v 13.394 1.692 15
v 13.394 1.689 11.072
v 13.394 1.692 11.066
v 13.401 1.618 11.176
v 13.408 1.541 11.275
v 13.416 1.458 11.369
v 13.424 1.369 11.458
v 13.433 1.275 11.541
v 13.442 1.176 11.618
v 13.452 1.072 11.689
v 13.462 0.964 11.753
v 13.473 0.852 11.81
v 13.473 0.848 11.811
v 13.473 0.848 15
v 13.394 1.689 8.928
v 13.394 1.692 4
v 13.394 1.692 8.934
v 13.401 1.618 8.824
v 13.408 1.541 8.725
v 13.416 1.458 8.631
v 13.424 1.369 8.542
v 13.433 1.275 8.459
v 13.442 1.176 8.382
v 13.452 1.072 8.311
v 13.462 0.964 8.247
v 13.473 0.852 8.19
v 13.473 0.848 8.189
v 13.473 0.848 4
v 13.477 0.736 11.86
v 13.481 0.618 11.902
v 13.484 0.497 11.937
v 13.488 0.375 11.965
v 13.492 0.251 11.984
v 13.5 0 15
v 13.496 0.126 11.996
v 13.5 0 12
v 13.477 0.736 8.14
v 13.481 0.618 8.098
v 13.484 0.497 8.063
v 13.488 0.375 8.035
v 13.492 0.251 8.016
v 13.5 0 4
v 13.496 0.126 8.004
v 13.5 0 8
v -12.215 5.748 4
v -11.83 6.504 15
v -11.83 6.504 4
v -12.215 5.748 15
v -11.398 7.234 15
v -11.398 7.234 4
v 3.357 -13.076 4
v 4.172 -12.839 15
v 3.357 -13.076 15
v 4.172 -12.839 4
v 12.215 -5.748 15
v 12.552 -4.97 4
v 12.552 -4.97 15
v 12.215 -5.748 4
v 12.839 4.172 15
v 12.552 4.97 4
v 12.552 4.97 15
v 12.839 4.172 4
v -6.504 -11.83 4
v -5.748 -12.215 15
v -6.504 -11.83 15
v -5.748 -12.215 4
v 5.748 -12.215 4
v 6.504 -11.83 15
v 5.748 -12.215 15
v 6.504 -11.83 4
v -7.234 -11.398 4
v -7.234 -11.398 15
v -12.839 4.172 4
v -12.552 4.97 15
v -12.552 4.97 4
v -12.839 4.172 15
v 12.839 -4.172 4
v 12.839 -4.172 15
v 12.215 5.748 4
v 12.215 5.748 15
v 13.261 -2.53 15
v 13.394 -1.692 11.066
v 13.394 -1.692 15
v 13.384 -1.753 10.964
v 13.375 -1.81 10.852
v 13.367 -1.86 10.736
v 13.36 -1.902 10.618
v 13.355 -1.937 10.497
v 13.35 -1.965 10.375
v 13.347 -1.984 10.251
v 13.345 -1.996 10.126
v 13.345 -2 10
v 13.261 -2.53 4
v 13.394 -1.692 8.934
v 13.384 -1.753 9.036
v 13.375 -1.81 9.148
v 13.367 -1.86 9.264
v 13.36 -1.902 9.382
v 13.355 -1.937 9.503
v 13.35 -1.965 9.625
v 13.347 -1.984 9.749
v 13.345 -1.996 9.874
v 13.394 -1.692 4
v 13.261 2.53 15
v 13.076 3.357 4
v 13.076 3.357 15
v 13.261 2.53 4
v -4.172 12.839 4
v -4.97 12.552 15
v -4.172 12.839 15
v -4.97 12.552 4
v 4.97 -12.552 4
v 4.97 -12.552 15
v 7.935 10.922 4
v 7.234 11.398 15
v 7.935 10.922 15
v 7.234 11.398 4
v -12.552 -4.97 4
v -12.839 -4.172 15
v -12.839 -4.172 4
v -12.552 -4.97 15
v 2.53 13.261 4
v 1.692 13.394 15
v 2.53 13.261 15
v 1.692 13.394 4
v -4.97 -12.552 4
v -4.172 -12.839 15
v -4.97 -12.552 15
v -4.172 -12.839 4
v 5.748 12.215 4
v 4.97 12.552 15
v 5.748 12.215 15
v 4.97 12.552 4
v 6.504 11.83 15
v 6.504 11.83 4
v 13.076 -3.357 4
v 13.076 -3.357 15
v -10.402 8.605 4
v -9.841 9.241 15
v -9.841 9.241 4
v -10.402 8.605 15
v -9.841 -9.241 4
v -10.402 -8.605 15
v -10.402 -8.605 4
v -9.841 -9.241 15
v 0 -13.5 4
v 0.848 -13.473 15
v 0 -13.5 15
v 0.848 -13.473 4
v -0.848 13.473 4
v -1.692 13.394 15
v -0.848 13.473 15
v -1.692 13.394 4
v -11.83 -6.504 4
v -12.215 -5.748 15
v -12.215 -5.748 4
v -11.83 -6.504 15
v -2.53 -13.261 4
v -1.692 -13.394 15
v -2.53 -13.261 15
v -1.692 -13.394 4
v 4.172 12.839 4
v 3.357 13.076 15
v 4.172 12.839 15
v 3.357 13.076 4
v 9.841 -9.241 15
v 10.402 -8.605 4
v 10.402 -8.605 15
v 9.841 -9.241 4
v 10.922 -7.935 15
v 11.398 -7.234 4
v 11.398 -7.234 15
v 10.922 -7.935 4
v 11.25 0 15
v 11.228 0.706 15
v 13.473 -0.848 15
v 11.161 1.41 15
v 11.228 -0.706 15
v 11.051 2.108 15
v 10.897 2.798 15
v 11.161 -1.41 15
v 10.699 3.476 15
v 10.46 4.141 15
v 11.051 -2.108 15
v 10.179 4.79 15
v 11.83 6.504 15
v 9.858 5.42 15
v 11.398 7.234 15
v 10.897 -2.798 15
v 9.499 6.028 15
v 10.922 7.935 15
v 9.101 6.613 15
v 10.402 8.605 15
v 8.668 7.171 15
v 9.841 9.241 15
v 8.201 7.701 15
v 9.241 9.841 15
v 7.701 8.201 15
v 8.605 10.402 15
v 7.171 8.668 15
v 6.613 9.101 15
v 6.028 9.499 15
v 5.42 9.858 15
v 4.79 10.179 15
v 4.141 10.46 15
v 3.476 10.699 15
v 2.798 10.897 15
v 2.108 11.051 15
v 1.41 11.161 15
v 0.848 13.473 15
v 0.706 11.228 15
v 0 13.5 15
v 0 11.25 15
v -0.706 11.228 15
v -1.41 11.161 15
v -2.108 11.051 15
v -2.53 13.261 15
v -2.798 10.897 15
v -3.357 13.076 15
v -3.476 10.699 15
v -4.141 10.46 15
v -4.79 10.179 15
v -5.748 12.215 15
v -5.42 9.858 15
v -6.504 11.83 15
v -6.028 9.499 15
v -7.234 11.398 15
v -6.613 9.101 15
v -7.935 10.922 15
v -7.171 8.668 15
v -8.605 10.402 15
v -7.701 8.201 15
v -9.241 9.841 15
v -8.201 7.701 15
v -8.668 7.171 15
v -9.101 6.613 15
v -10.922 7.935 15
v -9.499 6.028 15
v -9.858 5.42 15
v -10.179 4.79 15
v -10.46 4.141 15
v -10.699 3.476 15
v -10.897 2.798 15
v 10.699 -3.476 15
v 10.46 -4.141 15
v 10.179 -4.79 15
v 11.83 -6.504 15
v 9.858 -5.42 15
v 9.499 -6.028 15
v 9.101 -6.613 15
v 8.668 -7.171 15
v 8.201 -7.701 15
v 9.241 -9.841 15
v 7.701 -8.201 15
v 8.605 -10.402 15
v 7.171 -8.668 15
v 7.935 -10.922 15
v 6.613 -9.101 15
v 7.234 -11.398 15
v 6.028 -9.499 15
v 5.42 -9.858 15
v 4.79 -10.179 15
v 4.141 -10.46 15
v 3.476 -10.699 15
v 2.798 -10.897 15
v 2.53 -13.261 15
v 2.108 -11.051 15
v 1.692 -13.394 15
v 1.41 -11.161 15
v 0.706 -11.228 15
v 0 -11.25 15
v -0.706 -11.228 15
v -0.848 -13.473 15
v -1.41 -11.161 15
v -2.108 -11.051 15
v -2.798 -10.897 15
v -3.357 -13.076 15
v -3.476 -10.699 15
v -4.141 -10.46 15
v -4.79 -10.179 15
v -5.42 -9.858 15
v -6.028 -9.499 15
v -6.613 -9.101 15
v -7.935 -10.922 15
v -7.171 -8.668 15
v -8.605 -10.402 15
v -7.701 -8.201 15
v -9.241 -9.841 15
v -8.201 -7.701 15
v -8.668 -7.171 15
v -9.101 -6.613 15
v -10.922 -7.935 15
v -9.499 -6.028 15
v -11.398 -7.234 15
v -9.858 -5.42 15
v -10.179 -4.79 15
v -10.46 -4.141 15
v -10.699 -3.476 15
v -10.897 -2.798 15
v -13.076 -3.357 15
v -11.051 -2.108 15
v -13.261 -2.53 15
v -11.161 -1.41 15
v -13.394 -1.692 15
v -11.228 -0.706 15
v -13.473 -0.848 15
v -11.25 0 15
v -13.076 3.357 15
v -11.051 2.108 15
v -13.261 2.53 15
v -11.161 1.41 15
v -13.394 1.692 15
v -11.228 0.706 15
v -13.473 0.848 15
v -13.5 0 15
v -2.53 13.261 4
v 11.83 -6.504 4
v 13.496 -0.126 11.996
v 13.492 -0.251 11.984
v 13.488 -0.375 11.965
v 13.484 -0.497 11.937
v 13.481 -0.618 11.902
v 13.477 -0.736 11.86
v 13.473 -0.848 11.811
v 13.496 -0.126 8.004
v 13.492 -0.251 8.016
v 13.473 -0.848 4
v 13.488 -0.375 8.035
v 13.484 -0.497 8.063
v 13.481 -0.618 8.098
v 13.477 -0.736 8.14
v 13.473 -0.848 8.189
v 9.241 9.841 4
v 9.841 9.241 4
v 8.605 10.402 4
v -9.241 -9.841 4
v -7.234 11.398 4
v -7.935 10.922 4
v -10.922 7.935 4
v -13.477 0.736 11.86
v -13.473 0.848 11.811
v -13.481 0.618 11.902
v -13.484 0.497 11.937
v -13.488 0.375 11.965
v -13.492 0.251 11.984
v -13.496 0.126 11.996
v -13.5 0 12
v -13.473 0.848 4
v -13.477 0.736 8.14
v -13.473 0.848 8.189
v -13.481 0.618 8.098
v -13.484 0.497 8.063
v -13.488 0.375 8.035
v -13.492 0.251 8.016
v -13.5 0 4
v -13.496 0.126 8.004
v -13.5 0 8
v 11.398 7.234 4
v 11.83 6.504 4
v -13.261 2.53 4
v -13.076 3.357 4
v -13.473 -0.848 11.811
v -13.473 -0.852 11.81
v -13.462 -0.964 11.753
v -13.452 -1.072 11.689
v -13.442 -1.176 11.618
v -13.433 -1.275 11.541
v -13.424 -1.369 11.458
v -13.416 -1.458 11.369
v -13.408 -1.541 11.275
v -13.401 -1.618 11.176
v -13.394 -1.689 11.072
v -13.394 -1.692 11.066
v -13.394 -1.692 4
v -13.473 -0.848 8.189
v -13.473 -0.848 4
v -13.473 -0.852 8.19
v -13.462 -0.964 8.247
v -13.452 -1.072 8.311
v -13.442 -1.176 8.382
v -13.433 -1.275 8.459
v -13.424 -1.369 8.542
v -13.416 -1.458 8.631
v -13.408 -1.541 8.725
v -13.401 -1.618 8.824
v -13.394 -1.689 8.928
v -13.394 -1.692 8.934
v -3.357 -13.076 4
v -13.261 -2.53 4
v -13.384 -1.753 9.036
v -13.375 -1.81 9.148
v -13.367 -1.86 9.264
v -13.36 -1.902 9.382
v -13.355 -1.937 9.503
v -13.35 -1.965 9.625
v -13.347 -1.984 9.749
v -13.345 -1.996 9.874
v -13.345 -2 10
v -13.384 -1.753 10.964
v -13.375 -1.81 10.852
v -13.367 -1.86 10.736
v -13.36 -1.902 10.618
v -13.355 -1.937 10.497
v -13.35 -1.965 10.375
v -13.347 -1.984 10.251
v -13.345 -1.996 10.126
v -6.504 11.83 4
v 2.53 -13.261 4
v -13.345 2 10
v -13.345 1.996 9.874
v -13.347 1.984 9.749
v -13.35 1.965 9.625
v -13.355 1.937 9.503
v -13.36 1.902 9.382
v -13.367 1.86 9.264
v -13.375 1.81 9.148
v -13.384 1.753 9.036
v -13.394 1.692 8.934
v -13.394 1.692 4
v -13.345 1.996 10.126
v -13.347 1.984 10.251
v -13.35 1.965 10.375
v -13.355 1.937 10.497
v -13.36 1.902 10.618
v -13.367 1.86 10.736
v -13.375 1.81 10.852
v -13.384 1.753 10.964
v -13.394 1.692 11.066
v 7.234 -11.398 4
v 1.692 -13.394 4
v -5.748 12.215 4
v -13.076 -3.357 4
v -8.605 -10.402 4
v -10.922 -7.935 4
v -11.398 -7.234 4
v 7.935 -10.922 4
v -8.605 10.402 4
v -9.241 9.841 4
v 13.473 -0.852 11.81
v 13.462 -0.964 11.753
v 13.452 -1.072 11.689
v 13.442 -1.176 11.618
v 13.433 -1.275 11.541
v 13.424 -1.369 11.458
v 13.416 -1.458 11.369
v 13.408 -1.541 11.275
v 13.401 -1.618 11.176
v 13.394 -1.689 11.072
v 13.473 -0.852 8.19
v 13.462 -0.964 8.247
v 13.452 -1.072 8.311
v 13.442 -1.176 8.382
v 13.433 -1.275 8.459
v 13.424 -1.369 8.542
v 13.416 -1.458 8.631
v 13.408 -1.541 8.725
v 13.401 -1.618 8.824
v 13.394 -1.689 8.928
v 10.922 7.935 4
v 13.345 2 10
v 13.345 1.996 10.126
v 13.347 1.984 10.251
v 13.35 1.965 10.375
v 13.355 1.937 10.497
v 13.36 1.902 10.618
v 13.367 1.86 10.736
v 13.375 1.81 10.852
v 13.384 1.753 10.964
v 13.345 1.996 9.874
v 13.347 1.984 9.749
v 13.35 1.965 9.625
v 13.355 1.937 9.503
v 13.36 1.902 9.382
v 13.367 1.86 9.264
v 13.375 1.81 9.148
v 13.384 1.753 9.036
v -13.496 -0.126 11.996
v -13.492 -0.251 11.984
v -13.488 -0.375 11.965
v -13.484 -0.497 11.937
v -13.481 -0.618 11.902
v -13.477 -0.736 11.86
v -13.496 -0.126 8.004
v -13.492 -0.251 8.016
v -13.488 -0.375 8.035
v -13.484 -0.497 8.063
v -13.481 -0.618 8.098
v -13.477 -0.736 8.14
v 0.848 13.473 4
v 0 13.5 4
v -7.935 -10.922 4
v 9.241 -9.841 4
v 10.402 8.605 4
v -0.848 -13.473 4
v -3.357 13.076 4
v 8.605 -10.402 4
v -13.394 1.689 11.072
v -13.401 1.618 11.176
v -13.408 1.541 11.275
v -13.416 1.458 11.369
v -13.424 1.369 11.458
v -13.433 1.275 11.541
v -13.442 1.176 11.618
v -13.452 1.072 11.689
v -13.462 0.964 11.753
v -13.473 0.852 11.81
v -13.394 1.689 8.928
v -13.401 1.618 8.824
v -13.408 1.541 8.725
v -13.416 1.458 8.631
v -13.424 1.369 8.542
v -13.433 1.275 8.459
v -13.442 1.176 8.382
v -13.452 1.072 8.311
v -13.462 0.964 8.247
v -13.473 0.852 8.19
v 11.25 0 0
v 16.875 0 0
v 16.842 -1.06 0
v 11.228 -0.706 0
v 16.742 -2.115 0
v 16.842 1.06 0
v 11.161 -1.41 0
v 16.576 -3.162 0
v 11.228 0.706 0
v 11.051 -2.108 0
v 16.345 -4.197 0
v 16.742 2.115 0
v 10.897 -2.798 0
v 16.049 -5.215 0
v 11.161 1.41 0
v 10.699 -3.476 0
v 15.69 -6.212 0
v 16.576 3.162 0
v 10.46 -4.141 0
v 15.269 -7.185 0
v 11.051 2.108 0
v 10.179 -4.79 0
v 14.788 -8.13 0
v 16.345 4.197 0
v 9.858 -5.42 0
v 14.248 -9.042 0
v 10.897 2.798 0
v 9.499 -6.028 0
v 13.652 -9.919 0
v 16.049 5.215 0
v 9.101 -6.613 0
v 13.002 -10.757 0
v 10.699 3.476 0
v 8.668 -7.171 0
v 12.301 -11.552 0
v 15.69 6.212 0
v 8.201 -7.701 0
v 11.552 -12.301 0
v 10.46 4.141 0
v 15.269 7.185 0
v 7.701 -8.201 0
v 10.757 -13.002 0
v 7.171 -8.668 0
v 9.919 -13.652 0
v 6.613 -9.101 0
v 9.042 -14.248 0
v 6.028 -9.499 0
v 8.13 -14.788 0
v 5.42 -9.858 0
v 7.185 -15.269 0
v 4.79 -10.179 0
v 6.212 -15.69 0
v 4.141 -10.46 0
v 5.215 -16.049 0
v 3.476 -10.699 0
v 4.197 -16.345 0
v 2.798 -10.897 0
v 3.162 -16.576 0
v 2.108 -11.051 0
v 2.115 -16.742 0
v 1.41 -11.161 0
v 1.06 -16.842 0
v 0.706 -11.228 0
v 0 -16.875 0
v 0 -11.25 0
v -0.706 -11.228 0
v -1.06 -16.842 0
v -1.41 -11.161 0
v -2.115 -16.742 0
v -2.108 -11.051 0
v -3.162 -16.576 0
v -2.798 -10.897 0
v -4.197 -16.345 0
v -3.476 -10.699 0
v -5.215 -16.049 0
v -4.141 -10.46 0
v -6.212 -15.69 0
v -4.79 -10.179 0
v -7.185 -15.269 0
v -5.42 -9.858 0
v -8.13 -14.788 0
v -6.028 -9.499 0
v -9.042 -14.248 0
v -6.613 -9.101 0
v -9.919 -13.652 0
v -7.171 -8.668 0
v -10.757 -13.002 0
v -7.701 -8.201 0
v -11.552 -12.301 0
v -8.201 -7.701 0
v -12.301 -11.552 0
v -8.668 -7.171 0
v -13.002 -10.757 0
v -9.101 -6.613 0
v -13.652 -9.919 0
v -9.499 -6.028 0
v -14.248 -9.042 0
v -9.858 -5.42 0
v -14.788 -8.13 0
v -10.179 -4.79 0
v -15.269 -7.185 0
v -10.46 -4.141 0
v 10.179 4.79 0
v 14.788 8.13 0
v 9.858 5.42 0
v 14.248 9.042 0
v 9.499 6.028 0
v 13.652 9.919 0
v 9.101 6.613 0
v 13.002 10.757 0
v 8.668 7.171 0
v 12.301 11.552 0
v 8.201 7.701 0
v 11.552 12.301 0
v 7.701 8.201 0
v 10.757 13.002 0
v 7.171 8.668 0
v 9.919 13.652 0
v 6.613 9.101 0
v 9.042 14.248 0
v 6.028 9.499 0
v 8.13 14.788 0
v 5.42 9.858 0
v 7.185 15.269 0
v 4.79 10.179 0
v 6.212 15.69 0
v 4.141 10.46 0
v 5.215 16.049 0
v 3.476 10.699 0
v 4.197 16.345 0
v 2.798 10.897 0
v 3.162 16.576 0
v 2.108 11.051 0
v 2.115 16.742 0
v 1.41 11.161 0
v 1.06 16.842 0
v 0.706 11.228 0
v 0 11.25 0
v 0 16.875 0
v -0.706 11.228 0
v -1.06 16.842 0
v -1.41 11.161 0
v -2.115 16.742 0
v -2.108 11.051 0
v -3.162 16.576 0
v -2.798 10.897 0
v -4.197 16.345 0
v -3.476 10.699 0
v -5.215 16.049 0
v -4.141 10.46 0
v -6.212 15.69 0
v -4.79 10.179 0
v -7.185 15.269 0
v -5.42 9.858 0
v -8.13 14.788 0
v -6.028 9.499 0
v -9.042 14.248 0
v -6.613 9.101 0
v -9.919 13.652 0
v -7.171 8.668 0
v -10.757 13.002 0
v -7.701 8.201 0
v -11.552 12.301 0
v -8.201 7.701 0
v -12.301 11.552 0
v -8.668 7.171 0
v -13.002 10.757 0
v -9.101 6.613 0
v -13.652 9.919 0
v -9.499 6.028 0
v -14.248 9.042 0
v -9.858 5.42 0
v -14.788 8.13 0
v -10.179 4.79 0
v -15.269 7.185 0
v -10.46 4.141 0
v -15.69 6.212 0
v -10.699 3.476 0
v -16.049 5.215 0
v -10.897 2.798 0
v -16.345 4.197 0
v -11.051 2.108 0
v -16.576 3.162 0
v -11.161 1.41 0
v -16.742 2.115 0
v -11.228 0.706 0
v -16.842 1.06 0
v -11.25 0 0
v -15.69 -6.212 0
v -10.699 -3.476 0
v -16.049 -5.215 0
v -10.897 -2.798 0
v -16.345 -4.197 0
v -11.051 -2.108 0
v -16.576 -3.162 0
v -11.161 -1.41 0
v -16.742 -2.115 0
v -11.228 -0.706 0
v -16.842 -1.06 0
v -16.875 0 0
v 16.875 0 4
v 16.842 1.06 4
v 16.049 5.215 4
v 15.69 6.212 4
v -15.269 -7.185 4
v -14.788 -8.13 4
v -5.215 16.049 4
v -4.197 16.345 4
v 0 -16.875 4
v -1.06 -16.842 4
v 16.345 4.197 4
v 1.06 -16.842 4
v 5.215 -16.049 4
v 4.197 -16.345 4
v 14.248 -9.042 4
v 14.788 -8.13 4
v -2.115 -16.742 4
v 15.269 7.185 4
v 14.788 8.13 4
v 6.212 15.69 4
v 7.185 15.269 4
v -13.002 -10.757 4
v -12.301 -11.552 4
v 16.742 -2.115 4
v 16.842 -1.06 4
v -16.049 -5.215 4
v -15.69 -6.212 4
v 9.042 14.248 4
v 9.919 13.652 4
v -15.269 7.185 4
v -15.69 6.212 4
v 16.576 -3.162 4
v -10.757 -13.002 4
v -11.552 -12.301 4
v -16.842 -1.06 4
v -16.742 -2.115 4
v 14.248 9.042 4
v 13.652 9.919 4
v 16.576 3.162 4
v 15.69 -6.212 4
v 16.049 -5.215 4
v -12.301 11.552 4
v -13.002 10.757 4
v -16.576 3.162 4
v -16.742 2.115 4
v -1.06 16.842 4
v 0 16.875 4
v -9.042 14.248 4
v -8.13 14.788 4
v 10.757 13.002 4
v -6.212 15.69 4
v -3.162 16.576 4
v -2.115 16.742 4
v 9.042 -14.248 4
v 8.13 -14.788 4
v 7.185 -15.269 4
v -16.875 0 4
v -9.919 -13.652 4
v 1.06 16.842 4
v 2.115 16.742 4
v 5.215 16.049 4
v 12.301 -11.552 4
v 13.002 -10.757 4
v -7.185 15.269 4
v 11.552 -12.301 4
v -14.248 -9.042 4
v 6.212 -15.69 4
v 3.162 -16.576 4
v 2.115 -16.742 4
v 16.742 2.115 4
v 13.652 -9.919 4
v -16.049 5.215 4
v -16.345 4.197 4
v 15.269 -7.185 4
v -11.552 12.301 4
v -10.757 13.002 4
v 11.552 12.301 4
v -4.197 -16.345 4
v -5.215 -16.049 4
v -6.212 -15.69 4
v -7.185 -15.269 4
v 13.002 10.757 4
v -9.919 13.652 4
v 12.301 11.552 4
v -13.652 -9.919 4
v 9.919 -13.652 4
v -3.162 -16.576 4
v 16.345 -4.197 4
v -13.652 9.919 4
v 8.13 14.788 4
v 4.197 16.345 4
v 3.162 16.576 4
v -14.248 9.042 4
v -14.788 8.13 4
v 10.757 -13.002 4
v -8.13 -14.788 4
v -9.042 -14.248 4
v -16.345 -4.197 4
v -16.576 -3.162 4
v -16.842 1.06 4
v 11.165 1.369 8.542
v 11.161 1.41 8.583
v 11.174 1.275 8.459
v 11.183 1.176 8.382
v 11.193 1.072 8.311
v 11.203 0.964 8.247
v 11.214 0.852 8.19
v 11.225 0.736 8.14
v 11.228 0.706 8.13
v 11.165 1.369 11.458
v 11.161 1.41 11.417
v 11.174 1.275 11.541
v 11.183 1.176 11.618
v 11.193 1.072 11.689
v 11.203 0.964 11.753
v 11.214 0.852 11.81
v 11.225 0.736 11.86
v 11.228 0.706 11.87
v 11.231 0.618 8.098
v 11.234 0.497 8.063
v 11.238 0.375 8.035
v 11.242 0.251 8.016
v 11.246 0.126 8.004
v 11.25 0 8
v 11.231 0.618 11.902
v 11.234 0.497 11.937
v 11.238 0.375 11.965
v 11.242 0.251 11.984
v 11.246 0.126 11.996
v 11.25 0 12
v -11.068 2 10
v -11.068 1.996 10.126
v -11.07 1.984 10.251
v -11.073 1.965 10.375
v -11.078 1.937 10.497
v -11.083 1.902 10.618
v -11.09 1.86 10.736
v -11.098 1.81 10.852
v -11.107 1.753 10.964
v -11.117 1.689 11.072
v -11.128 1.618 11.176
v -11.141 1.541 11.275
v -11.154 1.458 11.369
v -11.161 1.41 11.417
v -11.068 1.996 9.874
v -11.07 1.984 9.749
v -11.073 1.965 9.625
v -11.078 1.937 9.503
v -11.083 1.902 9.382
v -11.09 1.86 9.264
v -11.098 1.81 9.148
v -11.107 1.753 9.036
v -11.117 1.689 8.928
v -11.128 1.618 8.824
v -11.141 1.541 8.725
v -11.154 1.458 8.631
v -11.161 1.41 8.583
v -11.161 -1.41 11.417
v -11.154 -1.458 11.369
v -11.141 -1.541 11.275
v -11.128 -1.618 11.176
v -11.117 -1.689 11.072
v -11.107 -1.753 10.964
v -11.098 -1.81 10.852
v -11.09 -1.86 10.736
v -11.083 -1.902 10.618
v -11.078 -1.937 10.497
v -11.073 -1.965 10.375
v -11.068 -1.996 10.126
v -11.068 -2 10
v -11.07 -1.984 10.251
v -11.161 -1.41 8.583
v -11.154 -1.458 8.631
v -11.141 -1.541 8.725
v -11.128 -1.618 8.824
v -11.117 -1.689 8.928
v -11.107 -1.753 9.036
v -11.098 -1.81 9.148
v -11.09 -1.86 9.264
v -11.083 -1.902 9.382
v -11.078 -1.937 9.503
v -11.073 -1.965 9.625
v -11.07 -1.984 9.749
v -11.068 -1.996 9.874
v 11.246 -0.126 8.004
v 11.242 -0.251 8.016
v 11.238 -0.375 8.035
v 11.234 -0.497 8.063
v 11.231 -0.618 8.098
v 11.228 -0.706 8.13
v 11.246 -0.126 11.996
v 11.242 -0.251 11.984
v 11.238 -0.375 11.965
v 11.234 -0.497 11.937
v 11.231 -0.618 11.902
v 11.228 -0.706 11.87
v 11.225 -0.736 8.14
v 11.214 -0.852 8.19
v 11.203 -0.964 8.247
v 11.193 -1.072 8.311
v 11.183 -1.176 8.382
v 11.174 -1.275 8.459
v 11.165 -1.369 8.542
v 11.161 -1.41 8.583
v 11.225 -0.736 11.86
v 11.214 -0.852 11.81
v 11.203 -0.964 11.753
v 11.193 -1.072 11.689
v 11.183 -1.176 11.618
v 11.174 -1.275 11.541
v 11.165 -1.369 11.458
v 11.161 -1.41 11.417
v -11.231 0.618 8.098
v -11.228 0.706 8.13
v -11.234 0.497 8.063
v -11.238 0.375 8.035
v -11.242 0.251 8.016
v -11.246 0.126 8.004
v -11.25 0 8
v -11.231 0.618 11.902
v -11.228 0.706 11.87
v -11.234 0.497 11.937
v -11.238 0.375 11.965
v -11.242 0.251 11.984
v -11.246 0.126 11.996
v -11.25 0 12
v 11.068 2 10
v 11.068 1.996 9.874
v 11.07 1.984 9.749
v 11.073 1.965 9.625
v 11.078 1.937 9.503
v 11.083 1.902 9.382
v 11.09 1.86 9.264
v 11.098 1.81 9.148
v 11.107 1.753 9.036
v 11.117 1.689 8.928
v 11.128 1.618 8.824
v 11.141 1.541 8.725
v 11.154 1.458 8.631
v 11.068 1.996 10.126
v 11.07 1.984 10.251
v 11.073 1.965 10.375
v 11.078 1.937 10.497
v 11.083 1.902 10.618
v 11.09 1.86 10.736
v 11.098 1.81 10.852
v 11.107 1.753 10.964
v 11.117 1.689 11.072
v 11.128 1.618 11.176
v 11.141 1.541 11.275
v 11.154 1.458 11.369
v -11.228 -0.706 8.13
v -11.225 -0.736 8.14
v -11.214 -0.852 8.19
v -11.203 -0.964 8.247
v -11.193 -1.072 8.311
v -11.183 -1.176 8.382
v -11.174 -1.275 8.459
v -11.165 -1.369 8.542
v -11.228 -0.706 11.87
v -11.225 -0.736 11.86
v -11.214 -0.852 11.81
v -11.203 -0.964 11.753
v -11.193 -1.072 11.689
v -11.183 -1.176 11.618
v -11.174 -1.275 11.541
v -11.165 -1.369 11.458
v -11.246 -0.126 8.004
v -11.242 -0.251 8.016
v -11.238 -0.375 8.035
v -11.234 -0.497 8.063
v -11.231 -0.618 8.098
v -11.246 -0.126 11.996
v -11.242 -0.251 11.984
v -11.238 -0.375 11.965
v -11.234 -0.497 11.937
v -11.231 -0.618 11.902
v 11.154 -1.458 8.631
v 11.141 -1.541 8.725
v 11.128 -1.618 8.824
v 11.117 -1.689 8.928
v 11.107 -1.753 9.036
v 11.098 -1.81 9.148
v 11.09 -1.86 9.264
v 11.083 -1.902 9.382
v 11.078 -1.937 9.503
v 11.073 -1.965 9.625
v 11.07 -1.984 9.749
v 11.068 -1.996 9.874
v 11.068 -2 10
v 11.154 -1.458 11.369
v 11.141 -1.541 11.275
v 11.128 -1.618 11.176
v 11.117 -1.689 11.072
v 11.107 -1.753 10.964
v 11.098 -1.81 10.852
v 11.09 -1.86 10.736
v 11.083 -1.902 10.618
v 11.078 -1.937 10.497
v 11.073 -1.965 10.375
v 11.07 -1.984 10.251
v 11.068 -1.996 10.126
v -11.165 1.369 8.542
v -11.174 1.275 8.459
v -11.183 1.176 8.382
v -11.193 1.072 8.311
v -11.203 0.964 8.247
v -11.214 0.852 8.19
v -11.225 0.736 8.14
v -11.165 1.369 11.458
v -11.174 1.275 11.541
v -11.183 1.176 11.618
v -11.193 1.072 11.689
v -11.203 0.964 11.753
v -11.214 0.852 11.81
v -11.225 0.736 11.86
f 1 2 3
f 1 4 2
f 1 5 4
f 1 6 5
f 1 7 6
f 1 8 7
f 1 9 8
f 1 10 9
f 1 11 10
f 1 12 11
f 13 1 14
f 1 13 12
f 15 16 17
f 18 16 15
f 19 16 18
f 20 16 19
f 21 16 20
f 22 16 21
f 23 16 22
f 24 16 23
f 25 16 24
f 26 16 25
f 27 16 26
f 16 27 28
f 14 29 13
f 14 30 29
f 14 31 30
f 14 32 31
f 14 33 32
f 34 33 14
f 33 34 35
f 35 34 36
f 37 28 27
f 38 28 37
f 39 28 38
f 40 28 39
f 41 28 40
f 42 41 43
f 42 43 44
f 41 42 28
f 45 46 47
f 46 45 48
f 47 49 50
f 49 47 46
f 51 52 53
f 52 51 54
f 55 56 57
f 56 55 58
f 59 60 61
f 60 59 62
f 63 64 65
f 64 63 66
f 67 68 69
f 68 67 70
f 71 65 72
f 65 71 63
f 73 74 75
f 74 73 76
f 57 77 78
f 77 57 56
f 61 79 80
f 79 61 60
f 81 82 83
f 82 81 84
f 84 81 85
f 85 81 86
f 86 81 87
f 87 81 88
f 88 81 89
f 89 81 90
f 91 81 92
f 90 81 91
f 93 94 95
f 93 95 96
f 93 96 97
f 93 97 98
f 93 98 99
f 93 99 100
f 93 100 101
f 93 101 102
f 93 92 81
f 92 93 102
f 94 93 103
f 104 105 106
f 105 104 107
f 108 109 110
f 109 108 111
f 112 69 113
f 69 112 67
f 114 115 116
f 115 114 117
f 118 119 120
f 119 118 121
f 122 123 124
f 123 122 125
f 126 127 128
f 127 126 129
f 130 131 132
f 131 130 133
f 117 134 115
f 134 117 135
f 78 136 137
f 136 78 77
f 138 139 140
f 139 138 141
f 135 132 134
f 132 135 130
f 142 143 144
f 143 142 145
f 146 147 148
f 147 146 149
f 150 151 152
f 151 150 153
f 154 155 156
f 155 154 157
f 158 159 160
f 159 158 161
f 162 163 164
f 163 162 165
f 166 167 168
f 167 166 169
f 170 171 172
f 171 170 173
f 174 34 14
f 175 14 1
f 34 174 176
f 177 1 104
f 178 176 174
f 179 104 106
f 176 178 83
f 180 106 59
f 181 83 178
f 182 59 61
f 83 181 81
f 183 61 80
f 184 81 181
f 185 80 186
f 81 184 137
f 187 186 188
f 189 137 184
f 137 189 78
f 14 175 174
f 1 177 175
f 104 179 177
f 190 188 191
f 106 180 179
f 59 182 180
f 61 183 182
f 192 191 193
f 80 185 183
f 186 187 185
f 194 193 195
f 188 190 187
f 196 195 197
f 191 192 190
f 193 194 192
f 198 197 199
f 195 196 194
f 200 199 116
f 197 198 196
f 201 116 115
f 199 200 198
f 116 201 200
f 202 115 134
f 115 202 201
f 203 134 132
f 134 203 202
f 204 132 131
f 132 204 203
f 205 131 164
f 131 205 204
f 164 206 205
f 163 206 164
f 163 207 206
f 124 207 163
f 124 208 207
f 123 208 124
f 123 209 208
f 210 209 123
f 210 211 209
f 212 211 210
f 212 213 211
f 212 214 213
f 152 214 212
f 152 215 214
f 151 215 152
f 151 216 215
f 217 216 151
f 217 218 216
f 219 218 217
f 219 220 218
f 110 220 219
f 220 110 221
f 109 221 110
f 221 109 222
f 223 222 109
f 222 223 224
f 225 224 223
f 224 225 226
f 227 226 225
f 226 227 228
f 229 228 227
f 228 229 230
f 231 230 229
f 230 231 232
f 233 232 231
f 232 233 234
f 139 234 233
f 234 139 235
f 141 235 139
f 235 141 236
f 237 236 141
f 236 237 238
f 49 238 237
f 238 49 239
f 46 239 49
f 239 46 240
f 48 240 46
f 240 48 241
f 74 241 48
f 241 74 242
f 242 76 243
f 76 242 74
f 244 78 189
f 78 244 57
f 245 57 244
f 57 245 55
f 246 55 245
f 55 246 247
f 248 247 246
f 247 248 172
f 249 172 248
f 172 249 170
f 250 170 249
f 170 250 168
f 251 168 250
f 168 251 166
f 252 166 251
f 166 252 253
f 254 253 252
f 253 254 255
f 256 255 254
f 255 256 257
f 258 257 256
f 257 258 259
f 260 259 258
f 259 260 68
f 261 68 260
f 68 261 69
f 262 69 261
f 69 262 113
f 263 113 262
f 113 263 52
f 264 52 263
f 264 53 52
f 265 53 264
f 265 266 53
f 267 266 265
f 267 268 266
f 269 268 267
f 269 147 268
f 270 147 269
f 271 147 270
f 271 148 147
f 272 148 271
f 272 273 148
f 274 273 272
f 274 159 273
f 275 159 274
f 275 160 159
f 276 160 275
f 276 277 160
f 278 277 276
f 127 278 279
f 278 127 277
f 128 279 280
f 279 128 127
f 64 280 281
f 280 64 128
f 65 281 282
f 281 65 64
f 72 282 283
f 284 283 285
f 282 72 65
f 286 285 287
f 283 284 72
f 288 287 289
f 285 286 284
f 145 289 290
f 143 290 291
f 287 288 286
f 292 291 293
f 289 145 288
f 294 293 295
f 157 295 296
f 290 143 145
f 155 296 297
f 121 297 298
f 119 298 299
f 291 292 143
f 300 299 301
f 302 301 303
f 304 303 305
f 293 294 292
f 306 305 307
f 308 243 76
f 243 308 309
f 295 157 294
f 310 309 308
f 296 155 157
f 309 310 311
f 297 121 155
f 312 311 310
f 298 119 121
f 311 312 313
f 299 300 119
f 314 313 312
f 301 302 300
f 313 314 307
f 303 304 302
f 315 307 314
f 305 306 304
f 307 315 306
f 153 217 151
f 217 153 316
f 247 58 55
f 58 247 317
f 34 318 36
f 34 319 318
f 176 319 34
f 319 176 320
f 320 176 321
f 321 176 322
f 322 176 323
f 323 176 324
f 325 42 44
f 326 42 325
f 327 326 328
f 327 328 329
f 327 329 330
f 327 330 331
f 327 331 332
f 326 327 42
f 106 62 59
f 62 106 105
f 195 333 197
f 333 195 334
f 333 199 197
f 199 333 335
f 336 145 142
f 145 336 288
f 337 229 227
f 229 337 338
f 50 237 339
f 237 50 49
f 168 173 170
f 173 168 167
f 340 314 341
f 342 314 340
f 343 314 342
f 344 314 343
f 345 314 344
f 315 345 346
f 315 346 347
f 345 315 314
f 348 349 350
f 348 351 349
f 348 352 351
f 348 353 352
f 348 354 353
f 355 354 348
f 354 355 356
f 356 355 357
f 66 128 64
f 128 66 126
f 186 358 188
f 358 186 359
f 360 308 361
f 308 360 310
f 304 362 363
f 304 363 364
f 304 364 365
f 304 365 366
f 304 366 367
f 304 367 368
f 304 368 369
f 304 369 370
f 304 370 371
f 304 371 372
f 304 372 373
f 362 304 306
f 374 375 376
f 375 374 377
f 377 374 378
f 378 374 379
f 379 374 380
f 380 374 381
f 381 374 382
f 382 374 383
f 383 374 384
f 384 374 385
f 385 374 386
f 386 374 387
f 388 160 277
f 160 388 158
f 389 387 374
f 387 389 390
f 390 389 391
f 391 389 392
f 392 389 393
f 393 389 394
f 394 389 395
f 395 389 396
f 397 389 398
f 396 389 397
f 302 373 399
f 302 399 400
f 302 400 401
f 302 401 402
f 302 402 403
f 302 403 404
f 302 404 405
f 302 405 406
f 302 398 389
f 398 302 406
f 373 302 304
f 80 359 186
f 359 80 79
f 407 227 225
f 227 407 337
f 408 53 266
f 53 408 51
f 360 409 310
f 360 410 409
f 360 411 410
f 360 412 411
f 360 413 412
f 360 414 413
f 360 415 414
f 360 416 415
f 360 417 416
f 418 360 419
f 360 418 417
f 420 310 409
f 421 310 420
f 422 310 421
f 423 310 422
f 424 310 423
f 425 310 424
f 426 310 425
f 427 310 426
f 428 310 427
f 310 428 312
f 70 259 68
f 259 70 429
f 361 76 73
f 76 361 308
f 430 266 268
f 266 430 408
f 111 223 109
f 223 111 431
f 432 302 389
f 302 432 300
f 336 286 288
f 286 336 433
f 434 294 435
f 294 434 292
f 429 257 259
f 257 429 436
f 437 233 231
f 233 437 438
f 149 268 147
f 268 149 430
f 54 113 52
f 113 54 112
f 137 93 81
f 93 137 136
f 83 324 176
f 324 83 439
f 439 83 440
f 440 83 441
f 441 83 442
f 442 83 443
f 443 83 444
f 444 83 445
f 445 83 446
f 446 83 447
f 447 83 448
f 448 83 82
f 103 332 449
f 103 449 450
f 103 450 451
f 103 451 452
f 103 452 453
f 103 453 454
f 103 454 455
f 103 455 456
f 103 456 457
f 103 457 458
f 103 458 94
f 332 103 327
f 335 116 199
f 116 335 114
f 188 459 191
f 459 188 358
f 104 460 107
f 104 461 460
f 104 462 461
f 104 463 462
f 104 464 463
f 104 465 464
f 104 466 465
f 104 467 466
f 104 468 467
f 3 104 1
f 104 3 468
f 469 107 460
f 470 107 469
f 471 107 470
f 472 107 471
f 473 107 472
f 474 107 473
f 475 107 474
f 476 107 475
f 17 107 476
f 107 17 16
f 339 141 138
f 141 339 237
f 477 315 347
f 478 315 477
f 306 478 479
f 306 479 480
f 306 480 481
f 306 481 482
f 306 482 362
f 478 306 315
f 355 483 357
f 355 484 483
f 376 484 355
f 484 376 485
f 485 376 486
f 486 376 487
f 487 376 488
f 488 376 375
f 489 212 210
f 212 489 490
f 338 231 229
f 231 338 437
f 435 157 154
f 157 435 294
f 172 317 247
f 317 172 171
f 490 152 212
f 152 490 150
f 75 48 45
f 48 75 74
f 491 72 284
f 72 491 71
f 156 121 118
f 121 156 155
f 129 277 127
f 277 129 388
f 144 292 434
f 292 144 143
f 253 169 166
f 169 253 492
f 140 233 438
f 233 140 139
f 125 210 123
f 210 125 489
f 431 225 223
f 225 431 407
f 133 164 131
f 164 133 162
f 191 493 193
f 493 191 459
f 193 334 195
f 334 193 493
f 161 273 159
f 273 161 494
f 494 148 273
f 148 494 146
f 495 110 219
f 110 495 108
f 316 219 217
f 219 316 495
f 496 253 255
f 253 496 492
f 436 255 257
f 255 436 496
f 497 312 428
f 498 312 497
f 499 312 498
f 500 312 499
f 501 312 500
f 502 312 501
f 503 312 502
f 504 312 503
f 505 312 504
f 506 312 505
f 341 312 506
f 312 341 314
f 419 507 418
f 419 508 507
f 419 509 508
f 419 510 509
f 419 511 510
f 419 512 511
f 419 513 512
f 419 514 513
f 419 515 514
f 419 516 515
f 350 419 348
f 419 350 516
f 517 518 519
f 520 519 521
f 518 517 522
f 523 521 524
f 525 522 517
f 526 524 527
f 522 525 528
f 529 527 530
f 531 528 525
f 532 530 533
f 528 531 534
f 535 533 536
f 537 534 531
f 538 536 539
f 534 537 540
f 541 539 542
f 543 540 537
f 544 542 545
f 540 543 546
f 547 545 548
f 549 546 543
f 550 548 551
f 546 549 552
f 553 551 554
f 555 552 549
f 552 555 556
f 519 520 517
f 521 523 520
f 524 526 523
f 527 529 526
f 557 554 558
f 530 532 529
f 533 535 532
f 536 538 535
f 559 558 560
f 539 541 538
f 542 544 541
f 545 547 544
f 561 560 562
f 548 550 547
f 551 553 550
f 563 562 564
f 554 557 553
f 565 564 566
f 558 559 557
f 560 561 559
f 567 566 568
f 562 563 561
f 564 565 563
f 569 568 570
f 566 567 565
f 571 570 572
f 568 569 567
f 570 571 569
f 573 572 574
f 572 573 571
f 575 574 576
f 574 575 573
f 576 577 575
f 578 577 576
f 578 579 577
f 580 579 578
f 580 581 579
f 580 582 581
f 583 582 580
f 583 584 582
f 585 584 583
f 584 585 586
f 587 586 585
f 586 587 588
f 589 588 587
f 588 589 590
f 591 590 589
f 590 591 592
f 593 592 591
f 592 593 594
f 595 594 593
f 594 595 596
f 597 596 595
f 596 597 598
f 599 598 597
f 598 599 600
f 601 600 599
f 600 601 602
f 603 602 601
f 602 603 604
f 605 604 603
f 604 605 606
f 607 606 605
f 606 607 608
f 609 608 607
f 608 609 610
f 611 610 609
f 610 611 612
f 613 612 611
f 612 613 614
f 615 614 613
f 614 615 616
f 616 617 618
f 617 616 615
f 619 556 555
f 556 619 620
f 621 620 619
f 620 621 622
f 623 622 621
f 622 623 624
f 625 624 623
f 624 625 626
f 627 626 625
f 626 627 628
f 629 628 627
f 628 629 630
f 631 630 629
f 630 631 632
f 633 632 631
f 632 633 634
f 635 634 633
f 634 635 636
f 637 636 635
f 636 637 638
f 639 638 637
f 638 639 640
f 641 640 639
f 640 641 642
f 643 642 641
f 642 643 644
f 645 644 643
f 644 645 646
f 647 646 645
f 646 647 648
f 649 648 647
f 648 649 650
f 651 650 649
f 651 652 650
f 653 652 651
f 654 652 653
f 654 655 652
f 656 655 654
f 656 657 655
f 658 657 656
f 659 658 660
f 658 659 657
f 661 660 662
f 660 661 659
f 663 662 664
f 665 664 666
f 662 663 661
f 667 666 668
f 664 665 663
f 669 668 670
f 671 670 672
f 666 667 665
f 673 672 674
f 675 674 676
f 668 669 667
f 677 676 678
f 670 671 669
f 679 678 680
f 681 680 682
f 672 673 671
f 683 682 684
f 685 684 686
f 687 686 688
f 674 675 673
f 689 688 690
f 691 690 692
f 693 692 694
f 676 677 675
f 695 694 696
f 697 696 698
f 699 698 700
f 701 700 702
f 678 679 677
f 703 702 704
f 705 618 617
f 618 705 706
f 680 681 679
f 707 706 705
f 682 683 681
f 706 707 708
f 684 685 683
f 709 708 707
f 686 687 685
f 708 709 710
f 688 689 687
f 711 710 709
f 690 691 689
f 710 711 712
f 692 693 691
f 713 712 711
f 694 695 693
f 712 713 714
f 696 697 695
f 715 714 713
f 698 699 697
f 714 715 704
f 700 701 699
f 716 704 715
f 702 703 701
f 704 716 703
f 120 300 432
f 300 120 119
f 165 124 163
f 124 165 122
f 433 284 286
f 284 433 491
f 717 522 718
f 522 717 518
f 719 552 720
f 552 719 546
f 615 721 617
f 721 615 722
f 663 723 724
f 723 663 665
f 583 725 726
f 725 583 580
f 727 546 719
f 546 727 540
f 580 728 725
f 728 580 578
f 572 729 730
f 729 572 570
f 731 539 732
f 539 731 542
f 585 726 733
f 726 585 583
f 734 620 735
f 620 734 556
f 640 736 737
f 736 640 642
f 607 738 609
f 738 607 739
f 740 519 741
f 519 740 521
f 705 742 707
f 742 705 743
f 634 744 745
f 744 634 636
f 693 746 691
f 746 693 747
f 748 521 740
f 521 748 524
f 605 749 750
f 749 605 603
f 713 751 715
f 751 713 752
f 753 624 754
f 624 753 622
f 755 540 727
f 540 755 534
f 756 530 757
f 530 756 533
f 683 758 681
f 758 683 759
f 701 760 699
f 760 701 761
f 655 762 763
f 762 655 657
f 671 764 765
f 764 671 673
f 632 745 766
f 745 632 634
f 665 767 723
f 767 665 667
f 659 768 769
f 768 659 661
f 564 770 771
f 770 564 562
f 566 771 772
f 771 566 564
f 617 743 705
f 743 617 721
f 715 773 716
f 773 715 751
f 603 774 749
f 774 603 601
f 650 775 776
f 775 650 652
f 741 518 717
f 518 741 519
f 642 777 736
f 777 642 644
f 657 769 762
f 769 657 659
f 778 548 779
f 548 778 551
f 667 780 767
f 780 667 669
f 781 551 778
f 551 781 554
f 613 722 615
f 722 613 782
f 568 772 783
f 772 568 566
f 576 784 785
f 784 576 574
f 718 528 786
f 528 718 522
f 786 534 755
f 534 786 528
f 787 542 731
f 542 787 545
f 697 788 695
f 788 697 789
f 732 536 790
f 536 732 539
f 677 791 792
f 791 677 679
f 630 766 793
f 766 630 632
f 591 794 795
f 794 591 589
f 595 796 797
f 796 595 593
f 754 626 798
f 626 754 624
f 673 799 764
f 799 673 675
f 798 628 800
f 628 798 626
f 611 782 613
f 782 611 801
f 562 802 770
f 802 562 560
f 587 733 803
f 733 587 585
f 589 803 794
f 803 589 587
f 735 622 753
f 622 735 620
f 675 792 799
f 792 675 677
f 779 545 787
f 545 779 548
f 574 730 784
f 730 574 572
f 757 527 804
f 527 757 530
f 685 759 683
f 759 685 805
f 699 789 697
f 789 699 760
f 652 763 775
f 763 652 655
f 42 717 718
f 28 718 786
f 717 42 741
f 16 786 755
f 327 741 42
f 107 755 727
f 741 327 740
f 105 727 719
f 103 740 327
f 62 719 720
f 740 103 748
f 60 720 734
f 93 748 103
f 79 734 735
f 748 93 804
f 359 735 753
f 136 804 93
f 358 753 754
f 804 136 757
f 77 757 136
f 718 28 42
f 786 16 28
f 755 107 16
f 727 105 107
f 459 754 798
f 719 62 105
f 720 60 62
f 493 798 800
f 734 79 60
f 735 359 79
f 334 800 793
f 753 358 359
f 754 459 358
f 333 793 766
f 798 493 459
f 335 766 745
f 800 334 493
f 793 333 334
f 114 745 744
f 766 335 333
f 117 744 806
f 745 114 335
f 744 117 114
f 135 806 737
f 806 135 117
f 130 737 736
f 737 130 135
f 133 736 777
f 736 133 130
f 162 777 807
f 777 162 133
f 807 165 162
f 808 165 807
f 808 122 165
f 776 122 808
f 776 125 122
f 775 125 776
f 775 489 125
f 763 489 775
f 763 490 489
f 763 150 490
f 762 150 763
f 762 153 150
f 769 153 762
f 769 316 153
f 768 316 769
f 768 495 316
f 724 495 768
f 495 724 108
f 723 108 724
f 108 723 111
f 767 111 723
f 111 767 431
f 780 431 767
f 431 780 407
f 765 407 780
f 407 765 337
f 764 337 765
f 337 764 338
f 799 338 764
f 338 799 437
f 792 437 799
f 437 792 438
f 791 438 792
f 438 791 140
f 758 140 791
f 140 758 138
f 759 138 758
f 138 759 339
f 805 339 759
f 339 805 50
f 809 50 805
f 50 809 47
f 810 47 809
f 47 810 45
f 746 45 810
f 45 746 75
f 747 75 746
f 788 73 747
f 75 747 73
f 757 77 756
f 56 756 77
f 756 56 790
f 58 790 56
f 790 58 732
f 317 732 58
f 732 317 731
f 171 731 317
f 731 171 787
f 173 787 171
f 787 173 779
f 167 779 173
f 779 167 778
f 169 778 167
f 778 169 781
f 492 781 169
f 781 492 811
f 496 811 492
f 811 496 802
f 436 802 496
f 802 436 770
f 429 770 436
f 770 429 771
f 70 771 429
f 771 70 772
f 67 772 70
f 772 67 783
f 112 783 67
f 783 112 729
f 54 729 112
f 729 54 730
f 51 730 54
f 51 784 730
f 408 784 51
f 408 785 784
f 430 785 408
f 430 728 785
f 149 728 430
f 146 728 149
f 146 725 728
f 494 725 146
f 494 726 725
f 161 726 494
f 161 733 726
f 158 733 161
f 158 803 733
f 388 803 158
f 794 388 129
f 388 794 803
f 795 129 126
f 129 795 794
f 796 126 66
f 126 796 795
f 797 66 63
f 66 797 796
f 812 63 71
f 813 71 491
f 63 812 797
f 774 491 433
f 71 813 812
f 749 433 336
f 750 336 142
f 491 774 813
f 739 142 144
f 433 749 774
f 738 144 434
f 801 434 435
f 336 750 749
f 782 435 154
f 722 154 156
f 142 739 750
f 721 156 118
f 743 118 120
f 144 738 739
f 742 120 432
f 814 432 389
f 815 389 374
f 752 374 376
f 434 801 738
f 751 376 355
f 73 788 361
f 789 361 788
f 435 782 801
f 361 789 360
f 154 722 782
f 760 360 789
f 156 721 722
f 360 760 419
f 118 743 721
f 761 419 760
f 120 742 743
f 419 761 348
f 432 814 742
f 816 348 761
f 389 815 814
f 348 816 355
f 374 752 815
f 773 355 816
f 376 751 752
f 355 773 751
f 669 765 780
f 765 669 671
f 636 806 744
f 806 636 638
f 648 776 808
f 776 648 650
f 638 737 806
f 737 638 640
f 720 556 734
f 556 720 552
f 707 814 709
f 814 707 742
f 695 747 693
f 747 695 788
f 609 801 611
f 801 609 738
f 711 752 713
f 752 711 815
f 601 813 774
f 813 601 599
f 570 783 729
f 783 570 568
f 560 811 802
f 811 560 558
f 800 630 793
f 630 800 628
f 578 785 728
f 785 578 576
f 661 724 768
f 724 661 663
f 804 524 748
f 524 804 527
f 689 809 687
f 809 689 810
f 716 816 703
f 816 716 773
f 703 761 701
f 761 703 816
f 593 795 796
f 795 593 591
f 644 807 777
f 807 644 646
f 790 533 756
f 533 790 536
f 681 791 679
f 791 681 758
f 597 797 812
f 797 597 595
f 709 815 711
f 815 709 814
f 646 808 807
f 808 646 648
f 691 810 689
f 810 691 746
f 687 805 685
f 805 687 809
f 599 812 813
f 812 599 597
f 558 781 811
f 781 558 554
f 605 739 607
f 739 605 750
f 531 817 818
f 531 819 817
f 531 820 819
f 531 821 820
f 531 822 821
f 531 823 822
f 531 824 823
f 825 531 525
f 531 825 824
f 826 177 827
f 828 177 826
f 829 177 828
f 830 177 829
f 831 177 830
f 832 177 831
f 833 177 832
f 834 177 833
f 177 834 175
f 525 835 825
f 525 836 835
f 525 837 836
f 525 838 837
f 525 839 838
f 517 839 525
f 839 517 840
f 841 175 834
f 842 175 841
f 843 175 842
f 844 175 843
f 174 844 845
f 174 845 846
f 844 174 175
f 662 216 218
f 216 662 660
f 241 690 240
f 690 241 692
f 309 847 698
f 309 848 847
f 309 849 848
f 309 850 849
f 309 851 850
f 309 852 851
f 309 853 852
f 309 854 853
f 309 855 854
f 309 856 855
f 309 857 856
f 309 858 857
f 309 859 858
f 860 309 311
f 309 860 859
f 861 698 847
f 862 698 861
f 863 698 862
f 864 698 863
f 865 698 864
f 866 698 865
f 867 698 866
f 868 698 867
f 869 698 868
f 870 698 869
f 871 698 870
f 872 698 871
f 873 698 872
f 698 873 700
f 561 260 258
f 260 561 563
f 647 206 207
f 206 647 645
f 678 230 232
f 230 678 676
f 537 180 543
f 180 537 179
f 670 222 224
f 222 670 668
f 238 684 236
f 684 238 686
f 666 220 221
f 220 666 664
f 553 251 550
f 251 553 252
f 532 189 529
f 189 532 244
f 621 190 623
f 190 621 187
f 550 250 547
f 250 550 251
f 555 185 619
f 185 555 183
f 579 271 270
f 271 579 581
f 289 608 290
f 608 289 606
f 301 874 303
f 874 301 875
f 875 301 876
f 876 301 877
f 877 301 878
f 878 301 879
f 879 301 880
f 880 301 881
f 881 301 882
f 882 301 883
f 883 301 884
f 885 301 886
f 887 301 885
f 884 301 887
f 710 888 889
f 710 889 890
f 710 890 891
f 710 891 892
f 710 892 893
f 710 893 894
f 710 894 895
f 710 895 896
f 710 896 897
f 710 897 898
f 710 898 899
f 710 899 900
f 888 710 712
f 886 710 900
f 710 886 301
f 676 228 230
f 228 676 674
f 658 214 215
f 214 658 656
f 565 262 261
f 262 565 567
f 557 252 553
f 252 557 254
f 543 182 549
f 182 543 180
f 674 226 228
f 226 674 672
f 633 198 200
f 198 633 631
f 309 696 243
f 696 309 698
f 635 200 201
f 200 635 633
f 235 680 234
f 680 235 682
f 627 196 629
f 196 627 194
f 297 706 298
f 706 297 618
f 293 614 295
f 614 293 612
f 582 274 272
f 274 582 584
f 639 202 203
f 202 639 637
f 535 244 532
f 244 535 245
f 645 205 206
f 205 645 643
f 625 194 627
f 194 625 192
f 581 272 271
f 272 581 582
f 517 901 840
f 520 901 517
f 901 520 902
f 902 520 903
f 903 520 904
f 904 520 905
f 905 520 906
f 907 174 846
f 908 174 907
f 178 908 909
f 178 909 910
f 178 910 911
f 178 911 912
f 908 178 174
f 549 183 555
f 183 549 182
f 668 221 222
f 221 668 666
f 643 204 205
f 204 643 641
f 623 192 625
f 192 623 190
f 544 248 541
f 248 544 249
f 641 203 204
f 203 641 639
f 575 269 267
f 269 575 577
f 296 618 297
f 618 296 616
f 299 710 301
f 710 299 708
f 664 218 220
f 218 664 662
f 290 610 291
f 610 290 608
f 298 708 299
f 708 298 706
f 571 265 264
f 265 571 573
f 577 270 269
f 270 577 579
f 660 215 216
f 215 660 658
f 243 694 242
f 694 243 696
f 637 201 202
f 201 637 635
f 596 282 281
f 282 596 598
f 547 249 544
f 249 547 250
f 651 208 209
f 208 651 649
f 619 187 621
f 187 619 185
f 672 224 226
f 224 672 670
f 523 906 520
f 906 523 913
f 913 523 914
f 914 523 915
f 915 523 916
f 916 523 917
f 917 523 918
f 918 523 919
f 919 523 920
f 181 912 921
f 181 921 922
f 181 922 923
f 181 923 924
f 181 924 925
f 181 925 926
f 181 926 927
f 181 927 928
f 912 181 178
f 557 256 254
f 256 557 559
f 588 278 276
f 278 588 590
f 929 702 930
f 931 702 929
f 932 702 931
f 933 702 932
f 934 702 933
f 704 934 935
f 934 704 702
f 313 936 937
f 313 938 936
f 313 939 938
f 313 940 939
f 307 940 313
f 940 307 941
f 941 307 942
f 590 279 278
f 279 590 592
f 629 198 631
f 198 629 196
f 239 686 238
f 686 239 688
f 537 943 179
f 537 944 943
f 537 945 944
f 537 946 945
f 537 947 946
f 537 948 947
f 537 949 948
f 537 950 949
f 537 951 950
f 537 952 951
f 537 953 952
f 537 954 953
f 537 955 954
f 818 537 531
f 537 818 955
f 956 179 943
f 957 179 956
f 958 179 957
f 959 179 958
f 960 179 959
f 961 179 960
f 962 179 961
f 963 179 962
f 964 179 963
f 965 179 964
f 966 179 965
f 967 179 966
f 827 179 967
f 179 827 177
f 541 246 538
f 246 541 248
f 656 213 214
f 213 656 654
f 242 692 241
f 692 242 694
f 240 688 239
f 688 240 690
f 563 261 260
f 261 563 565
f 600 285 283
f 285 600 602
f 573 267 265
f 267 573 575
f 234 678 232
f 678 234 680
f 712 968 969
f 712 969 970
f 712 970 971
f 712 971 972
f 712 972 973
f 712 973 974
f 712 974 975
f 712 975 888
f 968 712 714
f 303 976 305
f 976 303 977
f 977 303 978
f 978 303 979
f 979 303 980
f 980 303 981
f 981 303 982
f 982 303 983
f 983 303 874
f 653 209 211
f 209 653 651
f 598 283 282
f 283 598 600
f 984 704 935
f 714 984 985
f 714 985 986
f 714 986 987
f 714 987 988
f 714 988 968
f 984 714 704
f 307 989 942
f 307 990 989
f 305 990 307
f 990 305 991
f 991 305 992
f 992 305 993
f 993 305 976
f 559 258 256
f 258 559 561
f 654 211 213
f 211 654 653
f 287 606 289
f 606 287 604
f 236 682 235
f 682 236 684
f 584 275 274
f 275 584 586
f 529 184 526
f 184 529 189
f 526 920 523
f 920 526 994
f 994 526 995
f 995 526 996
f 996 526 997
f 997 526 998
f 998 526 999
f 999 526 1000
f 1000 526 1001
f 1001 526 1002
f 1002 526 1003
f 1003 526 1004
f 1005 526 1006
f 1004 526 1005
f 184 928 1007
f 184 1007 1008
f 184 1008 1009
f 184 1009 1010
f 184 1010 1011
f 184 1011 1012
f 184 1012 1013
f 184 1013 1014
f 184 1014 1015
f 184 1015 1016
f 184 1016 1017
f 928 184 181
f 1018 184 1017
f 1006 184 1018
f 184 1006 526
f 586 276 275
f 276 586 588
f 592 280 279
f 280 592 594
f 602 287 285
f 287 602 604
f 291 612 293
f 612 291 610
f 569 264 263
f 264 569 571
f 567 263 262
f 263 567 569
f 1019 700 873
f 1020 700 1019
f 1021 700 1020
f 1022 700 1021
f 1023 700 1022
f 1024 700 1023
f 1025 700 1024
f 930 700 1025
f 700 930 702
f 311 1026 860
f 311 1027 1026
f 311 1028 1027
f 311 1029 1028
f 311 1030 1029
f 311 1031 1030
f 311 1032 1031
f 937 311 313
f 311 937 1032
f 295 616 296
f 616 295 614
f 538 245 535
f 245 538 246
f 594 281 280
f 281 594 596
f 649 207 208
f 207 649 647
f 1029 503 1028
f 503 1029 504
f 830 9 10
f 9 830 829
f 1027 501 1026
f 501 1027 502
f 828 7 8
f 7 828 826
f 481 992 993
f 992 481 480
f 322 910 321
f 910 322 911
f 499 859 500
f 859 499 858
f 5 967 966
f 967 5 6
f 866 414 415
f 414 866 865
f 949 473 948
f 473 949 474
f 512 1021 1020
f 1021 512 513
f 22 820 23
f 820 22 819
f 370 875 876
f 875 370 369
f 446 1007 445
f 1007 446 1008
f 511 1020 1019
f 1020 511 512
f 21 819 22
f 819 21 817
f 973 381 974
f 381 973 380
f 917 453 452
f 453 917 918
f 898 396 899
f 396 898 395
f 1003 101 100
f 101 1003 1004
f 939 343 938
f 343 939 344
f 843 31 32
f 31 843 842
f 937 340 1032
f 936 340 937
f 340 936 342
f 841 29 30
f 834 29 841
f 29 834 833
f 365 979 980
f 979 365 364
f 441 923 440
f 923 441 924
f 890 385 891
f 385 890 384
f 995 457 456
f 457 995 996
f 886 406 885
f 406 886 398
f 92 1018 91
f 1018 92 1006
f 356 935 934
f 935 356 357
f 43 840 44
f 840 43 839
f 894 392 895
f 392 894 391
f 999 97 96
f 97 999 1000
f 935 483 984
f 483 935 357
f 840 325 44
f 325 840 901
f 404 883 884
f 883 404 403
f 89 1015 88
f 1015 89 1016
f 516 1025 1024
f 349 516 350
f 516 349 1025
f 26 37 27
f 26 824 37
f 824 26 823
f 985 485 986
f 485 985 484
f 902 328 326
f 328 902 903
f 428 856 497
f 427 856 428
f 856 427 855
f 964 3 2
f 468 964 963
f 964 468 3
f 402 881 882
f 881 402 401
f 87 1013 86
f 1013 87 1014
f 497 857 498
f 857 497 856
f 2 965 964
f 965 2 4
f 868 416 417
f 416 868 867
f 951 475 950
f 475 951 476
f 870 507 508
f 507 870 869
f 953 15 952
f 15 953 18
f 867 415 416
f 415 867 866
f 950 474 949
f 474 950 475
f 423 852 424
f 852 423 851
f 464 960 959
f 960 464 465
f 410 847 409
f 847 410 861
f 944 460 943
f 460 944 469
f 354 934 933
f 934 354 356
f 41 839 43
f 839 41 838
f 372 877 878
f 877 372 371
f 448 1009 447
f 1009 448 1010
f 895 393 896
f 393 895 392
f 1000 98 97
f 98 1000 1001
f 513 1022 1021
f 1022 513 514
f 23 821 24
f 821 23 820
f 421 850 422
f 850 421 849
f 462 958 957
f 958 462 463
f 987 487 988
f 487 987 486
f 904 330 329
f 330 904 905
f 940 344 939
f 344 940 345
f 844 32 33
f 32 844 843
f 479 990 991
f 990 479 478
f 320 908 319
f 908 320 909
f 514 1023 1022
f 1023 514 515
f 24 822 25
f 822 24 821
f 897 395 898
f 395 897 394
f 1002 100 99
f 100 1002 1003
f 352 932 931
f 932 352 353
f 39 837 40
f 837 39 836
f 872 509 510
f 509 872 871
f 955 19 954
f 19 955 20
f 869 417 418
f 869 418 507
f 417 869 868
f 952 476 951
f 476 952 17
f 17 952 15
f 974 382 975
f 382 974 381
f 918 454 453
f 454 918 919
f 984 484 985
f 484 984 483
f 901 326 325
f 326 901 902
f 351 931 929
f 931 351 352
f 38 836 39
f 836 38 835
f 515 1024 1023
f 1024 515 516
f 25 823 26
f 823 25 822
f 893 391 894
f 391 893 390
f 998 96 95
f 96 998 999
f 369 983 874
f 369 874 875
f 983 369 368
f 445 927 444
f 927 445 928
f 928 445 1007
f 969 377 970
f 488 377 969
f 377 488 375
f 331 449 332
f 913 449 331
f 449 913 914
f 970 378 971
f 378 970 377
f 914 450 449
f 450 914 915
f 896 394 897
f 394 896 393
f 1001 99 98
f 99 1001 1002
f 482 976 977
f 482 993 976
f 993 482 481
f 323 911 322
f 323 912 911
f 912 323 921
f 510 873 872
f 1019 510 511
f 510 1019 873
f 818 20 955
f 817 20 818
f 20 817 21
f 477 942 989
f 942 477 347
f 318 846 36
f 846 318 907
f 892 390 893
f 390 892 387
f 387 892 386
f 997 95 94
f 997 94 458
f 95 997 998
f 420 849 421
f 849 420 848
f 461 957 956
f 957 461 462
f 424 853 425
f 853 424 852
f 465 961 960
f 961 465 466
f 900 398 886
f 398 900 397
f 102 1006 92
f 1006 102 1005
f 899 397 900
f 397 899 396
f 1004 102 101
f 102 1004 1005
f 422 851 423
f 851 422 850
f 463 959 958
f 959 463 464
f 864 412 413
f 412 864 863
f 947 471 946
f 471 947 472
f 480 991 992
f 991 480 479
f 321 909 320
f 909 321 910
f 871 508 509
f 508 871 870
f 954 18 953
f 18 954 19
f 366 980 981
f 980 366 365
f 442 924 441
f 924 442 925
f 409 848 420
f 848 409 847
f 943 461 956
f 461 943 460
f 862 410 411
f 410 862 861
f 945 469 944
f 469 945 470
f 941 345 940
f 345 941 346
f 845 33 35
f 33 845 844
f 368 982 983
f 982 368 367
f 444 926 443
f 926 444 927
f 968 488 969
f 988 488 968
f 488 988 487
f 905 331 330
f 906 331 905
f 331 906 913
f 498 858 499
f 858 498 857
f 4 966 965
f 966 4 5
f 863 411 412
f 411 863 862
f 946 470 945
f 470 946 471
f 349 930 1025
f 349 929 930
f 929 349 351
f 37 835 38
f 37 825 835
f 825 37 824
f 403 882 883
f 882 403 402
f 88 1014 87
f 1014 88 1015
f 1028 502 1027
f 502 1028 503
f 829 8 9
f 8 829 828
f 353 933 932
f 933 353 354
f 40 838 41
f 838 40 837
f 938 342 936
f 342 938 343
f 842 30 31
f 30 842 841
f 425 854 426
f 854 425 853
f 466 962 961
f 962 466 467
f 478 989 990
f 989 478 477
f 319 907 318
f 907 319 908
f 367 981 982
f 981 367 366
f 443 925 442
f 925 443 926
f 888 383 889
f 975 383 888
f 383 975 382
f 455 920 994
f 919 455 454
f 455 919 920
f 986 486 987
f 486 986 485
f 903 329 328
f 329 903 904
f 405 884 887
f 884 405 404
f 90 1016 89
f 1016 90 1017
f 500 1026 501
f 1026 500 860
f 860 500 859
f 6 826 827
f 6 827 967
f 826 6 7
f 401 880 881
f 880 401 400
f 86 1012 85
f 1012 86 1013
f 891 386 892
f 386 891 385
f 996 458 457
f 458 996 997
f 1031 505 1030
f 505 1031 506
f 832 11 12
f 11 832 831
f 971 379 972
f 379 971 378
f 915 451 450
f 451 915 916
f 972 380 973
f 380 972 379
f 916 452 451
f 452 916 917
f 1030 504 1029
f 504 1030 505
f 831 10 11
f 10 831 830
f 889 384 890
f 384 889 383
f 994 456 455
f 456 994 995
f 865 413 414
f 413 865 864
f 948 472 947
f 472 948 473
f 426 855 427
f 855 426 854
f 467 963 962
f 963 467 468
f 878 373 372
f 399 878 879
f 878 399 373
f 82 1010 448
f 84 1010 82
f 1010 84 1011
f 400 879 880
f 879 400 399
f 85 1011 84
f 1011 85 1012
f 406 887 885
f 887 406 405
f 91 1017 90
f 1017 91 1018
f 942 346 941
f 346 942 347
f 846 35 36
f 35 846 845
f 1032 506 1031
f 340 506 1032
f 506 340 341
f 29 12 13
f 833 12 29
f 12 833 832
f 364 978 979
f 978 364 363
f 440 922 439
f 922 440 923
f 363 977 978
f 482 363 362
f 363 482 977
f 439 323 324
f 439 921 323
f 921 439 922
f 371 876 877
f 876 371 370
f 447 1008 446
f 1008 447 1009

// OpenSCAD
shaft_radius = (0.5 * 22.5);
flange_length = 15;
flange_lip_height = 4;
large_radius = shaft_radius * 1.5;
small_radius = shaft_radius * 1.2;
$fn = 100;

difference() {
	union() {
		translate(v = [0, 0, 0.5 * flange_length]) {
			cylinder(h = flange_length, r1 = small_radius, r2 = small_radius, center = true);
		}
		translate(v = [0, 0, 0.5 * flange_lip_height])
			cylinder(h = flange_lip_height, r1 = large_radius, r2 = large_radius, center = true);
	}
	translate(v = [0, 0, 0.5 * flange_length])
		cylinder(h = flange_length * 2, r1 = shaft_radius, r2 = shaft_radius, center = true);
	translate(v = [-20, 0, 10])
		rotate(v = [0, 1, 0], a = 90)
			cylinder(h = 40, r1 = 2, r2 = 2);
}
